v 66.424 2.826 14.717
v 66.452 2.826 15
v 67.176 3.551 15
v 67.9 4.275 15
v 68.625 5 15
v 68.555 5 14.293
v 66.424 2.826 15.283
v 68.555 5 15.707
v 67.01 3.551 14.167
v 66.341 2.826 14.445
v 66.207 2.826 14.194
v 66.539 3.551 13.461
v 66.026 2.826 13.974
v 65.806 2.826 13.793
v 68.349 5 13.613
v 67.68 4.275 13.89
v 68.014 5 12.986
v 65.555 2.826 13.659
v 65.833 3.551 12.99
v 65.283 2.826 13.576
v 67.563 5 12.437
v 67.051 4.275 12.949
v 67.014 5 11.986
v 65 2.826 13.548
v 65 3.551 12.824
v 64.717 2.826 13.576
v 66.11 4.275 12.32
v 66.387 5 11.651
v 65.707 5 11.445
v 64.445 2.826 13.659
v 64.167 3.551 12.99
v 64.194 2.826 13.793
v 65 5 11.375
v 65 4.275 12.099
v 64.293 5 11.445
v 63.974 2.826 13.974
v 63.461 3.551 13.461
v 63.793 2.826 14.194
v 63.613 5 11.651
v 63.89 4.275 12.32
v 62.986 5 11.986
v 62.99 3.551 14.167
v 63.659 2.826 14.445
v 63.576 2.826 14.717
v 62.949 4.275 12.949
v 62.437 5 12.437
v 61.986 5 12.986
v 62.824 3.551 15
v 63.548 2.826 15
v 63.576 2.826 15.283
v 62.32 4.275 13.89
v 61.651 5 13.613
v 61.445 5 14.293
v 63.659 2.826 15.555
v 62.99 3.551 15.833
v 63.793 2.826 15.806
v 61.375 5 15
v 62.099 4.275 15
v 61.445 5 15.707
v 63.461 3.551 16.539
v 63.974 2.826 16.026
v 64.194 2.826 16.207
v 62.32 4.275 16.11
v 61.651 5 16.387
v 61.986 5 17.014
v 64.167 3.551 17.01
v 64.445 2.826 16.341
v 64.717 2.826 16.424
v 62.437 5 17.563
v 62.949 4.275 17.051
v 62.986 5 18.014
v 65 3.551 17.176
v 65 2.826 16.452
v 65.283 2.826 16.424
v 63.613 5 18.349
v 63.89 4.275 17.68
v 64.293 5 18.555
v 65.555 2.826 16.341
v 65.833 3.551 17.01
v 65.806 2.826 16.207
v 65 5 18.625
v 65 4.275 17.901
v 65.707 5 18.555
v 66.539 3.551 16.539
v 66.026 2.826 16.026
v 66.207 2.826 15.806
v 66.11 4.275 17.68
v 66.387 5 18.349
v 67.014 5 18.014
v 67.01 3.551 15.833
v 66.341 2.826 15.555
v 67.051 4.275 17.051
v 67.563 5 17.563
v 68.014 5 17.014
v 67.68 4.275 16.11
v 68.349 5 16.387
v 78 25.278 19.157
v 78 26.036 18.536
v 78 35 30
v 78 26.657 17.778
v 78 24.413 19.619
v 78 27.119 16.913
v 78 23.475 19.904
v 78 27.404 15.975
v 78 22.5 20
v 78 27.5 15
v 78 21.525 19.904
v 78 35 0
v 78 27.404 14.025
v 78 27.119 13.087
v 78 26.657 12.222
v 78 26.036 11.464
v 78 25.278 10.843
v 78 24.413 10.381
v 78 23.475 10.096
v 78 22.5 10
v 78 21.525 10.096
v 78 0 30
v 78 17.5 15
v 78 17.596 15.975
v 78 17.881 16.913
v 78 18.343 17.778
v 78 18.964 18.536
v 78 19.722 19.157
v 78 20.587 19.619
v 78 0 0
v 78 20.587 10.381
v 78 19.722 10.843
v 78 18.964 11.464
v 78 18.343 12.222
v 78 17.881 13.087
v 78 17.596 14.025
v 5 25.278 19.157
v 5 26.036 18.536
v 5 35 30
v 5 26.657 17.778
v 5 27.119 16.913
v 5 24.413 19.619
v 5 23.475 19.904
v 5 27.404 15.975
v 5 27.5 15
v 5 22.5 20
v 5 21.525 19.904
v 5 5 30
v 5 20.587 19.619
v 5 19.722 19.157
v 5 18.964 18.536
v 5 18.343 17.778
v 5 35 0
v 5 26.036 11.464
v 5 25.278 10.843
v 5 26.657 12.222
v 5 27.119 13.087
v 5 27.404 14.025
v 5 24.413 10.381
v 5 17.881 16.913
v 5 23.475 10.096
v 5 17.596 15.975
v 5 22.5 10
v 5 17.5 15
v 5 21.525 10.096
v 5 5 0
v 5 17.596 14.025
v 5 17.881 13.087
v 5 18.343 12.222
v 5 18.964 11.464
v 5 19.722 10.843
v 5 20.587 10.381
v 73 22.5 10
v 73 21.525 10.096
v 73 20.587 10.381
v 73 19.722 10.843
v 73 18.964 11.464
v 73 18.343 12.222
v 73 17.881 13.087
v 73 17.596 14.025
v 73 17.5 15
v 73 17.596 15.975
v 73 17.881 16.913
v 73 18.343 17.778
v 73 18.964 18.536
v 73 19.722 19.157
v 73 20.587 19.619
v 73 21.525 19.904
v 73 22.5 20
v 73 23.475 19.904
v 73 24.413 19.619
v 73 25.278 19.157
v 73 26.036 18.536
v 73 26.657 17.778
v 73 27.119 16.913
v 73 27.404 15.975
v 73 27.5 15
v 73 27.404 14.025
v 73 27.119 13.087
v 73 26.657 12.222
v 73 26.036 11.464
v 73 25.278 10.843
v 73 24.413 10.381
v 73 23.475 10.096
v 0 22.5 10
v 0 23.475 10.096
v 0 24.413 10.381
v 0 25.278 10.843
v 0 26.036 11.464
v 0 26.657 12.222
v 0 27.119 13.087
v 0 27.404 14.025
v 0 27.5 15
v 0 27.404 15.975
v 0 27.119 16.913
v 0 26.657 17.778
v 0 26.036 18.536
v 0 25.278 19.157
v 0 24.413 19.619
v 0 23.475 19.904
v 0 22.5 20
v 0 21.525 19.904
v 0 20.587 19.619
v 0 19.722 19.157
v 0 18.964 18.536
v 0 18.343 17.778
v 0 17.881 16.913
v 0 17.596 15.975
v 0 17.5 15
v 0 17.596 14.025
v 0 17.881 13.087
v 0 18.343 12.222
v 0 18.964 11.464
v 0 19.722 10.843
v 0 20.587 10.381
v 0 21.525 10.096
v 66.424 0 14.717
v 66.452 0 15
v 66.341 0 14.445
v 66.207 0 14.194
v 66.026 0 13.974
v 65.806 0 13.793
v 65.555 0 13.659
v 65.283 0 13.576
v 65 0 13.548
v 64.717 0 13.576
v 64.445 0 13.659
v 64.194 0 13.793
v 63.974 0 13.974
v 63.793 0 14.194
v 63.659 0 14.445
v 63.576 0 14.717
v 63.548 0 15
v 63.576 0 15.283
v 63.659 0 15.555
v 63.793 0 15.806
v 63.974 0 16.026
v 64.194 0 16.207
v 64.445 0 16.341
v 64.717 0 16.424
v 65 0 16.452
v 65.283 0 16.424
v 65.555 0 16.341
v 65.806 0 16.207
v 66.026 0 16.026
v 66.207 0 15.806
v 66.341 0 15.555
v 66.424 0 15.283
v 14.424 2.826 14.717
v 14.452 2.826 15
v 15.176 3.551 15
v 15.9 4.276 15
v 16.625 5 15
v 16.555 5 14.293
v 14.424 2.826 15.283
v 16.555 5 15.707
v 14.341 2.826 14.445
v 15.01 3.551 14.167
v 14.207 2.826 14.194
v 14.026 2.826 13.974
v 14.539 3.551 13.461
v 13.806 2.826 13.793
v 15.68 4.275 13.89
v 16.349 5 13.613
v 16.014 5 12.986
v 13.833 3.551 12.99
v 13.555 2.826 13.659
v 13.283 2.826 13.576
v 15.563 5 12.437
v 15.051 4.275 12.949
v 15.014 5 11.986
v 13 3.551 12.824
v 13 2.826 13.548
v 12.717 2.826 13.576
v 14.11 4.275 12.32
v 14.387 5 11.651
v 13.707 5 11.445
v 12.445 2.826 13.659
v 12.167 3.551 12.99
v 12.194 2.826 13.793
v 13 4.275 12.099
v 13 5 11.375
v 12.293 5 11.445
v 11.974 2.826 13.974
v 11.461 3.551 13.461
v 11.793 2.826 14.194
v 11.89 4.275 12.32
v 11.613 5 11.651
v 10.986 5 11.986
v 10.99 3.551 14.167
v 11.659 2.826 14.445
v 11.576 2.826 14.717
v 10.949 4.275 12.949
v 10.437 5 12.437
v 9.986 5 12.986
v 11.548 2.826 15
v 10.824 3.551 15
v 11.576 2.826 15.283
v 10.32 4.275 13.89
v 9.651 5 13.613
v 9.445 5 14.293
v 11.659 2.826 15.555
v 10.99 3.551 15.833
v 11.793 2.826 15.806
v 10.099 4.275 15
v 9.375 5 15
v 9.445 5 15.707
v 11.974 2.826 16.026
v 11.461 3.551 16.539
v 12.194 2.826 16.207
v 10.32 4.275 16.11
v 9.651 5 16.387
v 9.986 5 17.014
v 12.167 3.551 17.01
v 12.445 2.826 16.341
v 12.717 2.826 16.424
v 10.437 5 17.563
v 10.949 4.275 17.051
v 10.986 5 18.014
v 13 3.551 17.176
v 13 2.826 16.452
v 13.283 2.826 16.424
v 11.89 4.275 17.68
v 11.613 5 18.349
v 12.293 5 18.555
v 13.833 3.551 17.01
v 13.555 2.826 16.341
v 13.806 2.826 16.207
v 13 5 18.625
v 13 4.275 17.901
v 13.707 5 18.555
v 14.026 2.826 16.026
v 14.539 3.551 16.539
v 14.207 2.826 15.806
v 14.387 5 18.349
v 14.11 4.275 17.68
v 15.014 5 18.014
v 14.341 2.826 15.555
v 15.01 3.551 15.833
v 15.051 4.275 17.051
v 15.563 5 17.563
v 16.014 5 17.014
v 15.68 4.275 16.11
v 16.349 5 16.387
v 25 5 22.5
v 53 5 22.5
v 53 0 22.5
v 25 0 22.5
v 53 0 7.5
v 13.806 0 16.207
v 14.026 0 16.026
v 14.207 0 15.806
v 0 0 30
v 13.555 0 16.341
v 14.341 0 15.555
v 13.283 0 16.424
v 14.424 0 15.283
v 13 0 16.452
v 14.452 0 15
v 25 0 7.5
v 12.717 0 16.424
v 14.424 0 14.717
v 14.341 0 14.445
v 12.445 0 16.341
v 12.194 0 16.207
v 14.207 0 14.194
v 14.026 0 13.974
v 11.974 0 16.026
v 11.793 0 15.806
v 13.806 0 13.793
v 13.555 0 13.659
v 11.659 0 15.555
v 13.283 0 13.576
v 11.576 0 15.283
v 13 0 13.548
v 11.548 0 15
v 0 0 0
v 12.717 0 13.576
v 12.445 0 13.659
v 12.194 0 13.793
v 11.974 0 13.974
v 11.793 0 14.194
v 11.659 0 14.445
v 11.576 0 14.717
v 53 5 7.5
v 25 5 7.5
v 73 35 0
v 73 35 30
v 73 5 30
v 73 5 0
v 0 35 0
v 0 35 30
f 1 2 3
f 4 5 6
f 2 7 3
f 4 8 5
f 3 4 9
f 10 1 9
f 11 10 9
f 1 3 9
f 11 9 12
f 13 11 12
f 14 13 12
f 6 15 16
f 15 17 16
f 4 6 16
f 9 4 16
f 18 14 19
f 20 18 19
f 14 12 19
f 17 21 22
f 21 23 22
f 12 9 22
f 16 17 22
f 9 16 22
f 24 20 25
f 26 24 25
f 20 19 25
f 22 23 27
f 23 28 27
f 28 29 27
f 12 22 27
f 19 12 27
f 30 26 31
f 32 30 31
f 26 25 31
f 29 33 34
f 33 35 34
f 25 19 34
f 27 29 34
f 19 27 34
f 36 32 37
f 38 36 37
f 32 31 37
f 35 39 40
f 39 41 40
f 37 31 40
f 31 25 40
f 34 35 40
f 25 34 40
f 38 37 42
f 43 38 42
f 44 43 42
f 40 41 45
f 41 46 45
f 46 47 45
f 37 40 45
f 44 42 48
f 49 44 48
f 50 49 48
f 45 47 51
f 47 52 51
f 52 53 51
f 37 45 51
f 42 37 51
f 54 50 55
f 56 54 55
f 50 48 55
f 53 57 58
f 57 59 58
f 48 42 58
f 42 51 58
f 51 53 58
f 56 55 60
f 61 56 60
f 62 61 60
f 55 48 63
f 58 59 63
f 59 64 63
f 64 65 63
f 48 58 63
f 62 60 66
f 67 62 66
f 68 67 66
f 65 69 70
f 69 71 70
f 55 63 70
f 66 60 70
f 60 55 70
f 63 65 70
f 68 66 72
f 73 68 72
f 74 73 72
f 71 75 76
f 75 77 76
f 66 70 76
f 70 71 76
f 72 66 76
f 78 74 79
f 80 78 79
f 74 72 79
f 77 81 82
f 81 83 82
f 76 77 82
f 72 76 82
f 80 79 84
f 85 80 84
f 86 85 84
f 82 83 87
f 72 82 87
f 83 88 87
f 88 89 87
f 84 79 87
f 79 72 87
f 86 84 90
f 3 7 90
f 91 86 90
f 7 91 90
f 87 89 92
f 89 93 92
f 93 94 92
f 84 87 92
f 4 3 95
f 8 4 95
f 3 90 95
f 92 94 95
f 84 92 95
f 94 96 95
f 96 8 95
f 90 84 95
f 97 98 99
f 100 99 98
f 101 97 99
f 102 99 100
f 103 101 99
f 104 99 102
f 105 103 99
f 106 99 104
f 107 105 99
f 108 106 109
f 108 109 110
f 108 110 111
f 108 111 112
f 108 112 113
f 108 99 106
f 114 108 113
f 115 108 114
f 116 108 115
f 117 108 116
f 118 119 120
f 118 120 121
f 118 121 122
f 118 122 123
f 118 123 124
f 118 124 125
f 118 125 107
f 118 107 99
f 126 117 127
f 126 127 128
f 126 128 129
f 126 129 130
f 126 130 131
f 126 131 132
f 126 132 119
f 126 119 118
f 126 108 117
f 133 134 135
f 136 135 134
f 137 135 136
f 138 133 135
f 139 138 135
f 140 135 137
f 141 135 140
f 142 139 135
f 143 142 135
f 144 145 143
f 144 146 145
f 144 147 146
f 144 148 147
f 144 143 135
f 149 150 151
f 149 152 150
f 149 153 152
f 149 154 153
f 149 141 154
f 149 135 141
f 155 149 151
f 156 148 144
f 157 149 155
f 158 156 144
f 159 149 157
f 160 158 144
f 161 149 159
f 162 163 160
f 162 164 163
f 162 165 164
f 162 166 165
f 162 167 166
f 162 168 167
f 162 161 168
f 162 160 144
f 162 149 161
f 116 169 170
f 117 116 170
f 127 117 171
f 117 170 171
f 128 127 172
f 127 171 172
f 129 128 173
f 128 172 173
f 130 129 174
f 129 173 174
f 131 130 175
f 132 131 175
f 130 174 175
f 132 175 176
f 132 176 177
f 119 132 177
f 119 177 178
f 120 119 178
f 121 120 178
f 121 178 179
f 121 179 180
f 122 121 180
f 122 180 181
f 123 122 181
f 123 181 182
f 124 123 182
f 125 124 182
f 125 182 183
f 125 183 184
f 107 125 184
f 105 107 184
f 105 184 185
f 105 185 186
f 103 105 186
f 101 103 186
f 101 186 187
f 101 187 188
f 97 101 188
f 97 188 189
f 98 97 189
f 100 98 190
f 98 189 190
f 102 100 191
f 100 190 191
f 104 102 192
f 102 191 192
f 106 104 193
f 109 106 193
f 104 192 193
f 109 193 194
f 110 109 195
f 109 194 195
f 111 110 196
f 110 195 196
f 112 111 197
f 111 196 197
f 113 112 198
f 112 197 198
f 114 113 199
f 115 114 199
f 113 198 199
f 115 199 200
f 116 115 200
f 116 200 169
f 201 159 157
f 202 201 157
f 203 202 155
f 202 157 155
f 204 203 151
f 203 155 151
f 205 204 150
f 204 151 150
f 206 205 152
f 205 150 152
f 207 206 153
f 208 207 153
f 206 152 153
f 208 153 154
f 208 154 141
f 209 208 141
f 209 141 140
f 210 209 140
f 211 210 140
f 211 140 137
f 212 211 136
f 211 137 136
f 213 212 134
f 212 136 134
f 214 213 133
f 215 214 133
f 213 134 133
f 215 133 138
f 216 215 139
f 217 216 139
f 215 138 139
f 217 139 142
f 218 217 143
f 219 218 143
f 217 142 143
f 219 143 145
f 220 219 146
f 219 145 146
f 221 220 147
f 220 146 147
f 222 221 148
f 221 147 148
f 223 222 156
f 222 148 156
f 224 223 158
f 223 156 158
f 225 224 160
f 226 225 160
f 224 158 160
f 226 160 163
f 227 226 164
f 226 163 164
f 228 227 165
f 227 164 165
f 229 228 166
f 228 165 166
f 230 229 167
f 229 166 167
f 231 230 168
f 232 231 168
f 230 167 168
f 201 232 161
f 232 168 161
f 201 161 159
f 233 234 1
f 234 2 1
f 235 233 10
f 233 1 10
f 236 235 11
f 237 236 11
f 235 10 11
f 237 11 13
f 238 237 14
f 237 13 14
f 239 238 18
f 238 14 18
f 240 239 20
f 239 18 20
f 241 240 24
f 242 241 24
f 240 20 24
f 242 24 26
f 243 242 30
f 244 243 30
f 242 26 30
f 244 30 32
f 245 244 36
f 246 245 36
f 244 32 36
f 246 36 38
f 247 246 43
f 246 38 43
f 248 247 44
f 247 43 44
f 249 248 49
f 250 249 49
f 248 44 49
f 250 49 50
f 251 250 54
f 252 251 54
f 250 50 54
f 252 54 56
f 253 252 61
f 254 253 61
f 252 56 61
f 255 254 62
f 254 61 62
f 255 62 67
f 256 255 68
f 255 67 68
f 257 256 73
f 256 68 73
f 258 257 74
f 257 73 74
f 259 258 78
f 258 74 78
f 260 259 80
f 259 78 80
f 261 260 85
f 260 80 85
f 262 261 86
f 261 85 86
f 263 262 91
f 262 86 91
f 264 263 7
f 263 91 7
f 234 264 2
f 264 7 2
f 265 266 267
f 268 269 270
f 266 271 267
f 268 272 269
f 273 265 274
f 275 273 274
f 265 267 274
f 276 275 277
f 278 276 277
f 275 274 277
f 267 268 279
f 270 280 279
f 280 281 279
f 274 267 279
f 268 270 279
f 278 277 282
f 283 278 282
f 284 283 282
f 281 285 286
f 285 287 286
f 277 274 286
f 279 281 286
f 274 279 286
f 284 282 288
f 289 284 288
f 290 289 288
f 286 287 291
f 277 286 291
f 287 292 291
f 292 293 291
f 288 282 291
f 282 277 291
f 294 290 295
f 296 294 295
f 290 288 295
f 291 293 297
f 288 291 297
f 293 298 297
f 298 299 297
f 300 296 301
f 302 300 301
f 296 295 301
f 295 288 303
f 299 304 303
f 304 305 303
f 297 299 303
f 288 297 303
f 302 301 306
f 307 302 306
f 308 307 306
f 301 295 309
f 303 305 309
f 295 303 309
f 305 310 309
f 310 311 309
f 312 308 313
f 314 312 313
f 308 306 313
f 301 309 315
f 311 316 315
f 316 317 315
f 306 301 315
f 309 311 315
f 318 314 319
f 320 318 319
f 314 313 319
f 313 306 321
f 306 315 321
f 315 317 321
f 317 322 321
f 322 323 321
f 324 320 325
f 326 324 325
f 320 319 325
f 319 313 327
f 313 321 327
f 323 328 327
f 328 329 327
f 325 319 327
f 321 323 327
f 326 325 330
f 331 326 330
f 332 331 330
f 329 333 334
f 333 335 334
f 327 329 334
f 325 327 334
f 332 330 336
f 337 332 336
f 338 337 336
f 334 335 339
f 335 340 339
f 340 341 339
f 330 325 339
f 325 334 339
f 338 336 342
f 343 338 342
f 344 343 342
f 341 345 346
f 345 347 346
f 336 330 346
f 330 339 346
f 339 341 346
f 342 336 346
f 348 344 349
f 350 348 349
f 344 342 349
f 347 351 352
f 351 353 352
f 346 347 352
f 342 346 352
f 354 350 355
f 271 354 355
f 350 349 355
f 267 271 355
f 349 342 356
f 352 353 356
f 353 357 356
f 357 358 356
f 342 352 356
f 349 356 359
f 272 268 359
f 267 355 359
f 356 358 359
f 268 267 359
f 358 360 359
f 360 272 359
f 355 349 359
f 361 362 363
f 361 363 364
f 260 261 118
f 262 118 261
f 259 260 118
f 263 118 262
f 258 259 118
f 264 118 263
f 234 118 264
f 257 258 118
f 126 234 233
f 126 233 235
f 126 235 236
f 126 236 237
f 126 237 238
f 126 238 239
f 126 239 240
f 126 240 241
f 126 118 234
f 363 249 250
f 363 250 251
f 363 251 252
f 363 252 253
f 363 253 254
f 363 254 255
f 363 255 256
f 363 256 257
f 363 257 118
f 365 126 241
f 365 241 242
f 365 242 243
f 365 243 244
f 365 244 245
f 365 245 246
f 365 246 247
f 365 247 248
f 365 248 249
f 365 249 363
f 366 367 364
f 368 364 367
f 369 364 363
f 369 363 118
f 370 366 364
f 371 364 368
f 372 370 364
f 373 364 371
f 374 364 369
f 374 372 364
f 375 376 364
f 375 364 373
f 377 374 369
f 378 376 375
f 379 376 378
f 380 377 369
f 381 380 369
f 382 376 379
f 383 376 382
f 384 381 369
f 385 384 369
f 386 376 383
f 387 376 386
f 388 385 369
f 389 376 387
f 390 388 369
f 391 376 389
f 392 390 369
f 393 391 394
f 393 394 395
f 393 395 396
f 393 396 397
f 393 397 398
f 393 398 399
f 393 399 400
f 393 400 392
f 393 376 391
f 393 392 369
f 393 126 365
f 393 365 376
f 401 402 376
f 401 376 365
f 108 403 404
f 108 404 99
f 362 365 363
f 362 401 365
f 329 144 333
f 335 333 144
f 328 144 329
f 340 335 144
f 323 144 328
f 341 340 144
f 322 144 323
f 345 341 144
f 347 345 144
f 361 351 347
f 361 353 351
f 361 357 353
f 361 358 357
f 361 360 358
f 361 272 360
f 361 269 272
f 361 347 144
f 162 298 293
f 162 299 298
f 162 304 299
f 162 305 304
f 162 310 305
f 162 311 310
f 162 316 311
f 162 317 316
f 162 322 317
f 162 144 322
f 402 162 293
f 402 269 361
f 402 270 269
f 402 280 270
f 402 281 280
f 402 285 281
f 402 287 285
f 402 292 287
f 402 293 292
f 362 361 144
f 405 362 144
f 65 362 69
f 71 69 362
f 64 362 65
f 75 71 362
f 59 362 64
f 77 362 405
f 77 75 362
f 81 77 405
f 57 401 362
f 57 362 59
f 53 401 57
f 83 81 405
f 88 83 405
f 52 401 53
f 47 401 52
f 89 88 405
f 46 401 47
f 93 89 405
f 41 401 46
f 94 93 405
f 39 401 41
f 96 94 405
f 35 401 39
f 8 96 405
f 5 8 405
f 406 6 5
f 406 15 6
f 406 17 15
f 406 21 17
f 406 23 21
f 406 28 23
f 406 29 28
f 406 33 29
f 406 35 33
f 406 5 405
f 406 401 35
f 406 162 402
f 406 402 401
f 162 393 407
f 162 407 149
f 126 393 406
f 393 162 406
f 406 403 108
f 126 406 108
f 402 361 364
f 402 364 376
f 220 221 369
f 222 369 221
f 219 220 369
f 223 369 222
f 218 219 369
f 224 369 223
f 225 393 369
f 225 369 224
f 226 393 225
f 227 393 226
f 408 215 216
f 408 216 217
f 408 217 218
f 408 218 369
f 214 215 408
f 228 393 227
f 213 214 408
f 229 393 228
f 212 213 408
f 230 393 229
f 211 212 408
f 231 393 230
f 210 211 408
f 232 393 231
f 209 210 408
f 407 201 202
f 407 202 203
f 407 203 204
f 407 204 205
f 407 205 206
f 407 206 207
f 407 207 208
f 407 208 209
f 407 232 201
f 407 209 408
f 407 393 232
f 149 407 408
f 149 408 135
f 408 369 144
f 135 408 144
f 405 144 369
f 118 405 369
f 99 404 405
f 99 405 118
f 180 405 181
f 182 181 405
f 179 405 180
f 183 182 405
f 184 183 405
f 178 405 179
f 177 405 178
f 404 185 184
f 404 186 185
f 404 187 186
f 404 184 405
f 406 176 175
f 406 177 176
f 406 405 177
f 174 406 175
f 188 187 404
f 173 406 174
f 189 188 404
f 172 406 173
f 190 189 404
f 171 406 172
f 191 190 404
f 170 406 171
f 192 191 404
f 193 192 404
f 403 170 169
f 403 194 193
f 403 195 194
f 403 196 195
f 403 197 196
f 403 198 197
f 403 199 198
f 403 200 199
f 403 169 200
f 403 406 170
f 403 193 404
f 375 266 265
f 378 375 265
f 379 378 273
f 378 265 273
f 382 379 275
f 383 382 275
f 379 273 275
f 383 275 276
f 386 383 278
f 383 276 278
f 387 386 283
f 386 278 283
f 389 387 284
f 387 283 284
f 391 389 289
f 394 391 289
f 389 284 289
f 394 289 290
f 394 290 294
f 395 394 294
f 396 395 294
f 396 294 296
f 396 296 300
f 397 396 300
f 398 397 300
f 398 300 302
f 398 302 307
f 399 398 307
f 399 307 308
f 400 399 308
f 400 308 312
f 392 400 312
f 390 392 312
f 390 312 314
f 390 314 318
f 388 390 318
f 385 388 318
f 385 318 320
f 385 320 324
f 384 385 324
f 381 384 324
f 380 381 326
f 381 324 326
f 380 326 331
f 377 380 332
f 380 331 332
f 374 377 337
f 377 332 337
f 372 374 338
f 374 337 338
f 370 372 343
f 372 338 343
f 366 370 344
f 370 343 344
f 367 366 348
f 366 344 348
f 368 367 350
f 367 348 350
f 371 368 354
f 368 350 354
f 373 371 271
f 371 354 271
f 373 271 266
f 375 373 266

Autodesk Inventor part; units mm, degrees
ref_plane "YZ Plane" through (0, 0, 0) normal (1, 0, 0) x (0, 1, 0)
ref_plane "XZ Plane" through (0, 0, 0) normal (0, 1, 0) x (-1, 0, 0)
ref_plane "XY Plane" through (0, 0, 0) normal (0, 0, 1) x (1, 0, 0)
sketch "Sketch1" plane through (0, 0, 0) normal (0, 0, 1) x (1, 0, 0)
  line L0 (0, 0) -> (0, 35)
  line L1 (0, 35) -> (5, 35)
  line L2 (5, 35) -> (5, 5)
  line L3 (5, 5) -> (73, 5)
  line L4 (73, 5) -> (73, 35)
  line L5 (73, 35) -> (78, 35)
  line L6 (78, 35) -> (78, 0)
  line L7 (78, 0) -> (0, 0)
  dimension "d0" = 35
  dimension "d1" = 5
  dimension "d2" = 30
  dimension "d3" = 68
  dimension "d4" = 5
extrude "Extrusion1" add sketch "Sketch1" along normal blind 30
sketch "Sketch2" plane through (5, 5, 0) normal (1, 0, 0) x (0, 0, -1)
  circle A0 centre (-15, 17.5) radius 5
  line L0 (0, -5) -> (0, 30) projected
  line L1 (0, 30) -> (-30, 30) projected
  dimension "d7" = 10
  dimension "d8" = 15
  dimension "d9" = 12.5
extrude "Extrusion2" cut sketch "Sketch2" along normal mid plane 1000
sketch "Sketch3" plane through (5, 5, 0) normal (0, 1, 0) x (1, 0, 0)
  circle A0 centre (8, -15) radius 3.625
  line L0 (68, 0) -> (0, 0) projected
  line L1 (0, 0) -> (0, -30) projected
  circle A1 centre (60, -15) radius 3.625
  line L2 (68, 0) -> (68, -30) projected
  point P0 (-5, 0)
  dimension "d12" = 7.25
  dimension "d13" = 15
  dimension "d14" = 8
  dimension "d15" = 7.25
  dimension "d16" = 8
  dimension "d17" = 15
extrude "Extrusion3" cut sketch "Sketch3" against normal blind 2.1735 draft -45
sketch "Sketch4" plane through (13, 2.8265, 15) normal (0, 1, 0) x (1, 0, 0)
  circle A0 centre (0, 0) radius 1.4515 projected
  circle A1 centre (0, 0) radius 1.4515
  circle A2 centre (52, 0) radius 1.4515 projected
  circle A3 centre (52, 0) radius 1.4515
  point P0 (-13, 15)
extrude "Extrusion4" cut sketch "Sketch4" against normal blind 10
sketch "Sketch5" plane through (5, 5, 0) normal (0, 1, 0) x (1, 0, 0)
  line L0 (20, -7.5) -> (48, -7.5)
  line L1 (48, -7.5) -> (48, -22.5)
  line L2 (48, -22.5) -> (20, -22.5)
  line L3 (20, -22.5) -> (20, -7.5)
  line L4 (20, -7.5) -> (48, -22.5) construction
  line L5 (48, -7.5) -> (20, -22.5) construction
  line L6 (68, 0) -> (0, 0) projected
  line L7 (0, 0) -> (0, -30) projected
  point P0 (-5, 0)
  point P1 (34, -15)
  dimension "d22" = 28
  dimension "d23" = 15
  dimension "d24" = 15
  dimension "d25" = 34
extrude "Extrusion5" cut sketch "Sketch5" against normal through all
properties part number "1st arm to next clamp"
